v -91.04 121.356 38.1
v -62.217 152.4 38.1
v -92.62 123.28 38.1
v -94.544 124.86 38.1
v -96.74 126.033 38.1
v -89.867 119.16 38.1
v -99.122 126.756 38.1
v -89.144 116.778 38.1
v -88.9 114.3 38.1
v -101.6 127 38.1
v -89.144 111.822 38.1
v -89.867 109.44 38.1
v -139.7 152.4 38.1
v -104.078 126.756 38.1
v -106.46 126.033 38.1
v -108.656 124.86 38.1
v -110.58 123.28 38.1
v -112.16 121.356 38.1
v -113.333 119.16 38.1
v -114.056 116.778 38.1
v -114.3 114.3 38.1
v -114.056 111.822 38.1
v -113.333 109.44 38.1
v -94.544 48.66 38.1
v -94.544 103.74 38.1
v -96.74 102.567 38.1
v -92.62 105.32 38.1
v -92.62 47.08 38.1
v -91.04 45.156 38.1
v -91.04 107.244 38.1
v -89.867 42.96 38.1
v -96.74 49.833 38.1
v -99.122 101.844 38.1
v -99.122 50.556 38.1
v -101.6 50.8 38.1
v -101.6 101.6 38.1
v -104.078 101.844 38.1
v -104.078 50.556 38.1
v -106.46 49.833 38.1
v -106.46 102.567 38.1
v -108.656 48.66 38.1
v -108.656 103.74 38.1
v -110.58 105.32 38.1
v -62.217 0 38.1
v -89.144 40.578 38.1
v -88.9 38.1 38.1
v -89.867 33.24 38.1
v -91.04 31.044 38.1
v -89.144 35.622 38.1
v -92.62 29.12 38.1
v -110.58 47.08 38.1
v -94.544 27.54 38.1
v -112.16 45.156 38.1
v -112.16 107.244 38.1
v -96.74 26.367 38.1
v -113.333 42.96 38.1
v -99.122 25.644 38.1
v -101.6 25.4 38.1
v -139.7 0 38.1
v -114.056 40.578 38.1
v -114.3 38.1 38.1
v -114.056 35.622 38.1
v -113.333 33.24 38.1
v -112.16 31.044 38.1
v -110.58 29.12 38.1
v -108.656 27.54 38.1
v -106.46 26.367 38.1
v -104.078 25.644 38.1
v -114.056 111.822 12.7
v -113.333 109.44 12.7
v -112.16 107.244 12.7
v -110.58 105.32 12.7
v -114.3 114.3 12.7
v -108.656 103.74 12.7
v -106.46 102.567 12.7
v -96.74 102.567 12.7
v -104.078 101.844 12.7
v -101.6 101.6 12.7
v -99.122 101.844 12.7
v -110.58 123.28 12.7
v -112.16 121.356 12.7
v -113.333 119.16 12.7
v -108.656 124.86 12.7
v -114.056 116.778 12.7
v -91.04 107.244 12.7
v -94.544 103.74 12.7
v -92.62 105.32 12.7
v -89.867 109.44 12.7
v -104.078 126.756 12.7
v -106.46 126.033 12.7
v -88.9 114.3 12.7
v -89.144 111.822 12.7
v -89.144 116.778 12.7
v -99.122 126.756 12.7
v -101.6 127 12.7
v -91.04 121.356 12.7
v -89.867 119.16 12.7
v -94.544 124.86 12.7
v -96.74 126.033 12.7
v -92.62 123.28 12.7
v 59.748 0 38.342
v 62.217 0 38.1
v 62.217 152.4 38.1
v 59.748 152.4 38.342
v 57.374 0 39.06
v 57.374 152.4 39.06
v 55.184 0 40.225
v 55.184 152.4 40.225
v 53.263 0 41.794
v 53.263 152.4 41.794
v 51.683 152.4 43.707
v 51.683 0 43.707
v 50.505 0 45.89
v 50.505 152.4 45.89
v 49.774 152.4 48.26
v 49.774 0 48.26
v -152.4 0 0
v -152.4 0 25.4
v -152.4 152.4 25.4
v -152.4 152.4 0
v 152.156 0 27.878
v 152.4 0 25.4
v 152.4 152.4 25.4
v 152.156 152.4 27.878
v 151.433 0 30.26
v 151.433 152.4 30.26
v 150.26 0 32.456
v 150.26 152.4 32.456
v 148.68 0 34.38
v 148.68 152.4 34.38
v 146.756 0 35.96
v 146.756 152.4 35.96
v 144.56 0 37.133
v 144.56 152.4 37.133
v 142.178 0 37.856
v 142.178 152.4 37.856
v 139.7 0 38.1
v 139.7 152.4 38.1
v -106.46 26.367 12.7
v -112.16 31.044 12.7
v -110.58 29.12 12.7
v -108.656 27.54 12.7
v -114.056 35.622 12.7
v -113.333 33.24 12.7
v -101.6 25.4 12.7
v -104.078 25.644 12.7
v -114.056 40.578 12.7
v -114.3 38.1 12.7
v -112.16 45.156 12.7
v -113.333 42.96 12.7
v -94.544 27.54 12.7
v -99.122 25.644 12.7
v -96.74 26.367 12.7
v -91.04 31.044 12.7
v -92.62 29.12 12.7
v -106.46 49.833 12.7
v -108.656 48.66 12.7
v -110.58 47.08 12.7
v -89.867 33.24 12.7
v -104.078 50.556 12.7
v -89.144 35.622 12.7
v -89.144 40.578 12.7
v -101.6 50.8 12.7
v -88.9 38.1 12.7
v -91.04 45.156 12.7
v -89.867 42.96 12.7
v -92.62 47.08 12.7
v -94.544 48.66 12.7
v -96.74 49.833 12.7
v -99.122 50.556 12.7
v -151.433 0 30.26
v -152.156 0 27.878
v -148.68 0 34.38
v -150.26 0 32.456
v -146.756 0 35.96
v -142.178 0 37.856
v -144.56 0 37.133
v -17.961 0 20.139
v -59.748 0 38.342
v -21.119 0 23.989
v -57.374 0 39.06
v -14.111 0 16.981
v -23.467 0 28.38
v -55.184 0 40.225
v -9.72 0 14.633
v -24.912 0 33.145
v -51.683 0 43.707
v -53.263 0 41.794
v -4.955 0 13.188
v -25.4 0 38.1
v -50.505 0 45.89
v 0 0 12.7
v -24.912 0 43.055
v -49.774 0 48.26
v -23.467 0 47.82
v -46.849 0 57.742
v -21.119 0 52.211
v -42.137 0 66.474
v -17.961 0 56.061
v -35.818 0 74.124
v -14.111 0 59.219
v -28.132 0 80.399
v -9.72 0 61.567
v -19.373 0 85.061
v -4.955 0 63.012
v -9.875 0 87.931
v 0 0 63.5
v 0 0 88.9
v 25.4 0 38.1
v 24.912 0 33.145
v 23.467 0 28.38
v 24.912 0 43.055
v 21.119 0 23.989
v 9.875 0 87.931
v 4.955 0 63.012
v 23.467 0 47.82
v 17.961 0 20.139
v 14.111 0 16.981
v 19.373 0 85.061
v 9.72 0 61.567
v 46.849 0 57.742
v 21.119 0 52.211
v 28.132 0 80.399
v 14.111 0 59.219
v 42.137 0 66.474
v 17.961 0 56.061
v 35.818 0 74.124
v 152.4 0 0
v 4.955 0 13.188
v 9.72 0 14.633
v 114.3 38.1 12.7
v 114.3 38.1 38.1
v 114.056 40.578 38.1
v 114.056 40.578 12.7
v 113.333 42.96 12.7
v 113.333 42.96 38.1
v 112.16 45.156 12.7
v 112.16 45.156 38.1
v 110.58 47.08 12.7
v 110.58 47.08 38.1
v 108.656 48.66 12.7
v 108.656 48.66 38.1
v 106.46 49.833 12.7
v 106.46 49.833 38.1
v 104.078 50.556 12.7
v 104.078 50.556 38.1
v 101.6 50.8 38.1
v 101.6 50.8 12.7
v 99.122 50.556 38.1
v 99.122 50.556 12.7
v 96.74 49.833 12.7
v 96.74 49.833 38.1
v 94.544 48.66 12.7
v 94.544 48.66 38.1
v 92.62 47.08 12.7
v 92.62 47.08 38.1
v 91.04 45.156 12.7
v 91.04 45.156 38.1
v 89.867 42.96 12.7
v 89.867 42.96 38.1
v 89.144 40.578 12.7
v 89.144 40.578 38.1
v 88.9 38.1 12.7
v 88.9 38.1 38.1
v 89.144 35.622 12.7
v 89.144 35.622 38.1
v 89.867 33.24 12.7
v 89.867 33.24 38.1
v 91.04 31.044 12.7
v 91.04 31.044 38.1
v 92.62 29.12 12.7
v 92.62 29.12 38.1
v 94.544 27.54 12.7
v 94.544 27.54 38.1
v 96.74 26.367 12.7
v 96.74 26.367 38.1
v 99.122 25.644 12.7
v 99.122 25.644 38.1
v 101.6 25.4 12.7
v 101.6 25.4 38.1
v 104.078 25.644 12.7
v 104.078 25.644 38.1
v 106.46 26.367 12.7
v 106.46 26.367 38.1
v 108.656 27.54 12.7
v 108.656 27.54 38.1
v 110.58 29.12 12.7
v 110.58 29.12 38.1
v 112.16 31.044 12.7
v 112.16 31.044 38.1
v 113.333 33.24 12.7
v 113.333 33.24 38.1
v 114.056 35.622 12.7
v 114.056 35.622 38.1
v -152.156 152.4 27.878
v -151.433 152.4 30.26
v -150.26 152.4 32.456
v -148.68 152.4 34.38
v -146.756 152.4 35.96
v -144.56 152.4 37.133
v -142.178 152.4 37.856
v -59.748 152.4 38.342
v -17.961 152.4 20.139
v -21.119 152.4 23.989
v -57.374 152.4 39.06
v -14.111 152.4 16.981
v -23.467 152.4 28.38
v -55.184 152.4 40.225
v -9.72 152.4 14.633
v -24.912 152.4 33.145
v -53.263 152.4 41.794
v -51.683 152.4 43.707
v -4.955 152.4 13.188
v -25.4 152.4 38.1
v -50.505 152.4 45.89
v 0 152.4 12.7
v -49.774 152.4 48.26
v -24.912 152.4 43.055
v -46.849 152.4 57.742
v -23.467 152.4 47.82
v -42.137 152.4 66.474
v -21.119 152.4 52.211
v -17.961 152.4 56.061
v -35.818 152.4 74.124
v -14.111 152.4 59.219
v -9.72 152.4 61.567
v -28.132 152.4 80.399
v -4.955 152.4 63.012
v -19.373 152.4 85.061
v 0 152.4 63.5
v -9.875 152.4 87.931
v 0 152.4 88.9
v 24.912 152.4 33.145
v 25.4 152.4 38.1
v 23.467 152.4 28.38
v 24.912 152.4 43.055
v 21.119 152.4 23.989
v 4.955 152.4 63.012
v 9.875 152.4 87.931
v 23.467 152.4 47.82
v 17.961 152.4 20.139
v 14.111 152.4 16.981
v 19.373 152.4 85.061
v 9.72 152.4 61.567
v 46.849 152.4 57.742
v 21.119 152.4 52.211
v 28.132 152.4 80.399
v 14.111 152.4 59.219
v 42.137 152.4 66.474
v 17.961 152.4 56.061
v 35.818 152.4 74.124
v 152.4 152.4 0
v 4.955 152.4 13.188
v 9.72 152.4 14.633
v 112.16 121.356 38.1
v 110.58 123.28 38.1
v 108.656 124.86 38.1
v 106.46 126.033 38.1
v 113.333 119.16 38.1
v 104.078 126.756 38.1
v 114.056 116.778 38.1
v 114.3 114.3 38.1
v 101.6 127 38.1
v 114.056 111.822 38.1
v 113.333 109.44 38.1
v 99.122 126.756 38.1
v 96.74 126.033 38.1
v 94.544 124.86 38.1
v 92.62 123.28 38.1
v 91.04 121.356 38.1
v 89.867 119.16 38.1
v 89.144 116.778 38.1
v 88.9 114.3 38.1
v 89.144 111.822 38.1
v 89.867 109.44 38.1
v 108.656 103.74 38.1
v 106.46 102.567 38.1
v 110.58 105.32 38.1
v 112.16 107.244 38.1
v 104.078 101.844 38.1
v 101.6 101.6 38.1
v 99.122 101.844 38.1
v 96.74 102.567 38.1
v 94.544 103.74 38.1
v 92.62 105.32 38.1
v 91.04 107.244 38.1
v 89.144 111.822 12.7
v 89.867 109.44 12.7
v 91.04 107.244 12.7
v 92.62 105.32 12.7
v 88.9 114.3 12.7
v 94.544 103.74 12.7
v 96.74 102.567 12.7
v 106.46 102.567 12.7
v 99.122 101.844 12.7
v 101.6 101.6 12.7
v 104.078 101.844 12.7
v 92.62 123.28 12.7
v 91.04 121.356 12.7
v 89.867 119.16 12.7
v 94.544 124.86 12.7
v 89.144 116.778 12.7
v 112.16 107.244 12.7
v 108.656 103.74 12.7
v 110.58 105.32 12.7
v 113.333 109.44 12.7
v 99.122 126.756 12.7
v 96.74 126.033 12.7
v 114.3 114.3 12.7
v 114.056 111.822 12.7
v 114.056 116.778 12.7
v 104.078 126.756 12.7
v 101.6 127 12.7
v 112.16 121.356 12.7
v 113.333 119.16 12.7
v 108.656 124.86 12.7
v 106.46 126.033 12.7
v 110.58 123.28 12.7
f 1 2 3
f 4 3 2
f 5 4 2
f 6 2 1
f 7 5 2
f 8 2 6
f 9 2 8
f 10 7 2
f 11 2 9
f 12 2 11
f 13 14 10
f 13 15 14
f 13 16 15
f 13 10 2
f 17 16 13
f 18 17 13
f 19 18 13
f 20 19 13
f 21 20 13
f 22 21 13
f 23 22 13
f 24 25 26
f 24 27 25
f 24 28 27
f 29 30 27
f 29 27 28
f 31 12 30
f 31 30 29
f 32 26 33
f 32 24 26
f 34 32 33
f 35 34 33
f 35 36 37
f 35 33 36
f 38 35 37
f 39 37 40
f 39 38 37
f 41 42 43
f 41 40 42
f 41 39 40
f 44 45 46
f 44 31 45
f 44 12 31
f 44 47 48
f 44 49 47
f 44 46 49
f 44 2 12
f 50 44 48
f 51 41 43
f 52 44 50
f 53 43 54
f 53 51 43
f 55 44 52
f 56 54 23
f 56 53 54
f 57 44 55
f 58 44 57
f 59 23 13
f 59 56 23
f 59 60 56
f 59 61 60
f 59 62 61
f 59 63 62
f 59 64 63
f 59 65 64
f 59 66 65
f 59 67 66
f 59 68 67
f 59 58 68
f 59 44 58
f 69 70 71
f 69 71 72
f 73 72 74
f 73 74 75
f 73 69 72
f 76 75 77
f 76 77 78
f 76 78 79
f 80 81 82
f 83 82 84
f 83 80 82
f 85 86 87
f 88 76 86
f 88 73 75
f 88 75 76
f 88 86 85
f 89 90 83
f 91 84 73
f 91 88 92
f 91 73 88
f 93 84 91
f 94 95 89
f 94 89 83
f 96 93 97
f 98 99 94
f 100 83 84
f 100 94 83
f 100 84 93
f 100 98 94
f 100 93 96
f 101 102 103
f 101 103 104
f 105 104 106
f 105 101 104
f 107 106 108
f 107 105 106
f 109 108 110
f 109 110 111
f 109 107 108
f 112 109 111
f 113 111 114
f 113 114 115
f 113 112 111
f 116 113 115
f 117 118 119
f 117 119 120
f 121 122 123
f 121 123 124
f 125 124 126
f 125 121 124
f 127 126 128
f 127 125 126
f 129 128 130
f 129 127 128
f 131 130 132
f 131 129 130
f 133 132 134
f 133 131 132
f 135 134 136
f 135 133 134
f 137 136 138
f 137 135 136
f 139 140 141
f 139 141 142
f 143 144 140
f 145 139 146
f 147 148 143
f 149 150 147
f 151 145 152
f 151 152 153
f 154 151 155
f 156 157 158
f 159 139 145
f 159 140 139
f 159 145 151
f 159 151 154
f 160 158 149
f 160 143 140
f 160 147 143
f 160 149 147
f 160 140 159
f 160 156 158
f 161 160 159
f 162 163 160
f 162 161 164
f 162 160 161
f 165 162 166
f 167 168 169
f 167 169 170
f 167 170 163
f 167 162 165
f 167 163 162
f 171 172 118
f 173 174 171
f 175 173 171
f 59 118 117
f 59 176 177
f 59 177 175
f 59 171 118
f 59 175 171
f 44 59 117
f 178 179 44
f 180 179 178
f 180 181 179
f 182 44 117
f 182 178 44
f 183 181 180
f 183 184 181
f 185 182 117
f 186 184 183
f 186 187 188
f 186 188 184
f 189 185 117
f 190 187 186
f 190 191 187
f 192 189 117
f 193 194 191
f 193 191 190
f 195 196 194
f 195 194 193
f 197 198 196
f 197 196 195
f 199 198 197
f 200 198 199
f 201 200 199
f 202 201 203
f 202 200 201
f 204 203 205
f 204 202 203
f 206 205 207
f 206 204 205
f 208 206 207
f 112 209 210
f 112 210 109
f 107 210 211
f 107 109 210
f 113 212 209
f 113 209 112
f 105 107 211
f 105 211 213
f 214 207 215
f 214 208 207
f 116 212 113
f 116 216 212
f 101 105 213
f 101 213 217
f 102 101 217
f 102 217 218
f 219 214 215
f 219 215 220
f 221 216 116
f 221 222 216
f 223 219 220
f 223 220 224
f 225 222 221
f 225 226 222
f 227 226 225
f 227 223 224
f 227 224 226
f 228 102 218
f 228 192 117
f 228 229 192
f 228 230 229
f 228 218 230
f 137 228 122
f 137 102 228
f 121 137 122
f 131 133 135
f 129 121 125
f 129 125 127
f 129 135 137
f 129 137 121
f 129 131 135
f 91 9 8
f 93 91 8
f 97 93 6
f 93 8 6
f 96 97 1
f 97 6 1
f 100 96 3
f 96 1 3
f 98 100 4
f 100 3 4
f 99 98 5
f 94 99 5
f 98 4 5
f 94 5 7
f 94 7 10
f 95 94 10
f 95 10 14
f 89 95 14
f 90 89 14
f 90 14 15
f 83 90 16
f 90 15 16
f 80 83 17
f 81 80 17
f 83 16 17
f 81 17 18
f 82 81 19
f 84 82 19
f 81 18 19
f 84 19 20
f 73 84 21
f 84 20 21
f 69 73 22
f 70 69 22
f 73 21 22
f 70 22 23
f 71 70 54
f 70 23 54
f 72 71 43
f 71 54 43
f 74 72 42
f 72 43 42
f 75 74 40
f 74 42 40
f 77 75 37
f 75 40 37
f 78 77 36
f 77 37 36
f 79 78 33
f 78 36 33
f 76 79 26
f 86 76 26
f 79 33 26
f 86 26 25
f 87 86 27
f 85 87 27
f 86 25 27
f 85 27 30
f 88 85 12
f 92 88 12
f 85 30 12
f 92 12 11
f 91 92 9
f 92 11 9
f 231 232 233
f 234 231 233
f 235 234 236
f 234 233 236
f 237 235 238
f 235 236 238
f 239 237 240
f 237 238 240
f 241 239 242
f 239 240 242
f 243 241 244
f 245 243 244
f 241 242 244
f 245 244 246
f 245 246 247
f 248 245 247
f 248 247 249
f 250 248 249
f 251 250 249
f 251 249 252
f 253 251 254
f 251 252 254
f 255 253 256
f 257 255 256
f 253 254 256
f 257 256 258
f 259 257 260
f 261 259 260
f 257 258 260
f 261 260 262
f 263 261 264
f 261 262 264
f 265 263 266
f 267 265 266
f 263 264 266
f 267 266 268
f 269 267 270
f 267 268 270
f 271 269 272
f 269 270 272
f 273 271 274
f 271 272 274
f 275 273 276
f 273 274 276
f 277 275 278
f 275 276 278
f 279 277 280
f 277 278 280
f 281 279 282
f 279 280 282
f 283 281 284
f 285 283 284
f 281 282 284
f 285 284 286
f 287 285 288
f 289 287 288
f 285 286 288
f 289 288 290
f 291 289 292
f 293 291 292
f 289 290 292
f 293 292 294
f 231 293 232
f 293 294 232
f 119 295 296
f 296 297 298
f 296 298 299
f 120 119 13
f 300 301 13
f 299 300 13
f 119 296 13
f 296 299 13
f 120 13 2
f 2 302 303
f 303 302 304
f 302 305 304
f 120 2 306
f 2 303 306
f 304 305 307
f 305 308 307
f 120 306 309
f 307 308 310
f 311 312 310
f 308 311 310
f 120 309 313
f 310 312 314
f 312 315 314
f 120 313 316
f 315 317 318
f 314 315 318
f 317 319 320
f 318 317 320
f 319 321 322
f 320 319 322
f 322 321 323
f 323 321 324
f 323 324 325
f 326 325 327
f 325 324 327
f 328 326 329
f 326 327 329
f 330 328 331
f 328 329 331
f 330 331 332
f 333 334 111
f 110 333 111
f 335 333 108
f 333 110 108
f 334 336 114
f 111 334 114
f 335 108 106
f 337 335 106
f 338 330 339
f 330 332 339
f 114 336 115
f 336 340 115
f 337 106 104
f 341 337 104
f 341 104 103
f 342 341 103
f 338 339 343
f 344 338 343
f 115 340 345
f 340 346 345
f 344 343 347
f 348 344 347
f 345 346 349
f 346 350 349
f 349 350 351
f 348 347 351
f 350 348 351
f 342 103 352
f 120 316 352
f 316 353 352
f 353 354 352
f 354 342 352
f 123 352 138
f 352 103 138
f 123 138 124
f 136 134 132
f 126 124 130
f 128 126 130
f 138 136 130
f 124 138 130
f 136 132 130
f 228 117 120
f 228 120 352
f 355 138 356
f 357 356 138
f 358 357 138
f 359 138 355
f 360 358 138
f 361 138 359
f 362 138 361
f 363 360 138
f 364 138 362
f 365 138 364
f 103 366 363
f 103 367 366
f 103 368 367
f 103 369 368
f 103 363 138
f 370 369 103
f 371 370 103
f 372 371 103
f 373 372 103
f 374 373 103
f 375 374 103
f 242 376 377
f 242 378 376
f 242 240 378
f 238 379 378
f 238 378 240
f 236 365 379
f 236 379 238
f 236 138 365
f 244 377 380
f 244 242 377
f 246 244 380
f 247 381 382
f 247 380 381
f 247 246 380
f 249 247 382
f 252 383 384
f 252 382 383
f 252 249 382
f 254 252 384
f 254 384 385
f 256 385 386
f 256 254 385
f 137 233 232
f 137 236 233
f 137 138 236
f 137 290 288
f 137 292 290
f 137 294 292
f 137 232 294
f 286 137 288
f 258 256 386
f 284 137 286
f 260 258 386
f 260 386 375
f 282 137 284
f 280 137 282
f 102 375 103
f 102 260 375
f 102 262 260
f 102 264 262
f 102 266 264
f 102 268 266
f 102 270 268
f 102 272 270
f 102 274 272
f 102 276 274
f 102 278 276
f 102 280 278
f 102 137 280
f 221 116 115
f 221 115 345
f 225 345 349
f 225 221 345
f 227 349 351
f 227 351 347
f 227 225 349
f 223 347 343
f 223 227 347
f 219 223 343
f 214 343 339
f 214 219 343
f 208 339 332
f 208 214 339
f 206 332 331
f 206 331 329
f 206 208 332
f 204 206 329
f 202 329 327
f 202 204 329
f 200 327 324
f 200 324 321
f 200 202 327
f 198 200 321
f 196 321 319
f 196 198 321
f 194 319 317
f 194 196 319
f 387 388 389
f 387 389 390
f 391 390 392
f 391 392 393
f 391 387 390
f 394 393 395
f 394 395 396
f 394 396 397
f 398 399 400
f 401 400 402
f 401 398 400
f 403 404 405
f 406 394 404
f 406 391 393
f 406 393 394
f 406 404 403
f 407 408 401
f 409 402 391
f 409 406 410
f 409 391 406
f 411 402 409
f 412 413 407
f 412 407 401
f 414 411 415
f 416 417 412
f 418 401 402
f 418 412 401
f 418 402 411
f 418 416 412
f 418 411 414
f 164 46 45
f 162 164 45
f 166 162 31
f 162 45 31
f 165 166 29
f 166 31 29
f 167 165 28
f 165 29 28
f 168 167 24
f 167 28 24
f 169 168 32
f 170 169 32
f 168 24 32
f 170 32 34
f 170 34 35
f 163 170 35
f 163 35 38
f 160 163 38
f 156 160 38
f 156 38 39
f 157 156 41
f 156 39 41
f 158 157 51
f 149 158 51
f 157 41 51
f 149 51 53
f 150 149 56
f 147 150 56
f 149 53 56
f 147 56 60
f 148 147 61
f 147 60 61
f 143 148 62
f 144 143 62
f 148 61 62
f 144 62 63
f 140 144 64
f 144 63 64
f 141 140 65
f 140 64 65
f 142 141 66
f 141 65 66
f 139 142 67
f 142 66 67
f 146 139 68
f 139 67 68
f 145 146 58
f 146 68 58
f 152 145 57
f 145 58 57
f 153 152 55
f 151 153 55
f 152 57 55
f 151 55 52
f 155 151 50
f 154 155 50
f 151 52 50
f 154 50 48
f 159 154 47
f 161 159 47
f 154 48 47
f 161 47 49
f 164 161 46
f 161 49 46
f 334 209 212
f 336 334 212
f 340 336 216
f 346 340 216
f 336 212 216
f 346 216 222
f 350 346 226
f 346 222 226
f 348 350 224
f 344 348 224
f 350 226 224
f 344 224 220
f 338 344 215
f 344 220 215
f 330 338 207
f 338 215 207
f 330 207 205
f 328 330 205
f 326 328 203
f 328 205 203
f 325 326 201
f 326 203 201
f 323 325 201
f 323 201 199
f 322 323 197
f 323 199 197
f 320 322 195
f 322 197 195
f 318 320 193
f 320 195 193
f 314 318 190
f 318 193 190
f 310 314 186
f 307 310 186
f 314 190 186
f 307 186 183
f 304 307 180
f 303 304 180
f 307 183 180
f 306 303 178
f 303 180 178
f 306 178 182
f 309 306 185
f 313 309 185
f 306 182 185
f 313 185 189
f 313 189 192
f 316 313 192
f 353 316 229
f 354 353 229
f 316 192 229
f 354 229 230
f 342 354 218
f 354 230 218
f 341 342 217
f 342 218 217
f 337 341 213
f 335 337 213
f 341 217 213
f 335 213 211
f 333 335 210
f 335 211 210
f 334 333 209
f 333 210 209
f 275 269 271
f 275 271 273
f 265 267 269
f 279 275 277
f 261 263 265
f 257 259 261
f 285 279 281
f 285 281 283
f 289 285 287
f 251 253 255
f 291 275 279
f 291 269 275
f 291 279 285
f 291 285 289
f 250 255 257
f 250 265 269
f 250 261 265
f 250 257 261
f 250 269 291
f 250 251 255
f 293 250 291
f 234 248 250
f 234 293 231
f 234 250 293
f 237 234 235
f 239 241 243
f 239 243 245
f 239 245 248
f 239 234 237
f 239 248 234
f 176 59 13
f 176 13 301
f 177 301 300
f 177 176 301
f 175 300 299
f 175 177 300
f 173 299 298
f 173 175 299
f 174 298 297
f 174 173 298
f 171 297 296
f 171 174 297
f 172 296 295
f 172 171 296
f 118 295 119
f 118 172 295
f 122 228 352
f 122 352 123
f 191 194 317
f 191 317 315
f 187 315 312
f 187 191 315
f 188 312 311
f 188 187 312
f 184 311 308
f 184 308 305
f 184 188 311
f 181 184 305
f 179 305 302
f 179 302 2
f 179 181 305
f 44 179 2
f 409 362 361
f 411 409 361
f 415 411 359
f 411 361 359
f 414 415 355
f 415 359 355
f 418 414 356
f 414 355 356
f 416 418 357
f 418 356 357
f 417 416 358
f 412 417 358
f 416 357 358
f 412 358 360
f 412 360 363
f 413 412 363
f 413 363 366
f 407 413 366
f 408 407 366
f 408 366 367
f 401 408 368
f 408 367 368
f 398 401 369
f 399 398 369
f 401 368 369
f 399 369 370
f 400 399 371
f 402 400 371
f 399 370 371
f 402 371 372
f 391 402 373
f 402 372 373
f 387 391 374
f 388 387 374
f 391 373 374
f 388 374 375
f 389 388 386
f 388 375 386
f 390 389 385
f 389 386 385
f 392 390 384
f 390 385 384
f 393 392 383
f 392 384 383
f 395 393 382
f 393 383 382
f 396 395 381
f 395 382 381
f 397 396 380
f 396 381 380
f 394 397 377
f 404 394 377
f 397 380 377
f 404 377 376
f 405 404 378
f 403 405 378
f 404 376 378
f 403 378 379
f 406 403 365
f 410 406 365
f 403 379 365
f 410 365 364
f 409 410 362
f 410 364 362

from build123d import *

# Parameters (mm, degrees)
F0_R     = 25.4
F1_DEPTH = 152.4
F2_R     = 12.7
F3_DEPTH = 25.4


with BuildPart() as f1:
    # F0 (on Front) → F1 (new body)
    with BuildSketch(Plane.XZ):
        with BuildLine():
            Line((-152.4, 25.4), (-152.4, 0))
            Line((-152.4, 0), (152.4, 0))
            Line((152.4, 0), (152.4, 25.4))
            ThreePointArc((152.4, 25.4), (148.680256, 34.380256), (139.7, 38.1))
            Line((139.7, 38.1), (62.217039, 38.1))
            ThreePointArc((62.217039, 38.1), (54.184854, 40.962622), (49.773632, 48.26))
            ThreePointArc((49.773632, 48.26), (0, 88.9), (-49.773632, 48.26))
            ThreePointArc((-49.773632, 48.26), (-54.184854, 40.962622), (-62.217039, 38.1))
            Line((-62.217039, 38.1), (-139.7, 38.1))
            ThreePointArc((-139.7, 38.1), (-148.680256, 34.380256), (-152.4, 25.4))
        make_face()
        with Locations((0, 38.1)):
            Circle(F0_R, mode=Mode.SUBTRACT)
    extrude(amount=-F1_DEPTH)

    # F2 (on face) → F3 (cut)
    with BuildSketch(Plane.XY.offset(38.1)):
        with Locations((-101.6, 114.3)):
            Circle(F2_R)
        with Locations((-101.6, 38.1)):
            Circle(F2_R)
        with Locations((101.6, 114.3)):
            Circle(F2_R)
        with Locations((101.6, 38.1)):
            Circle(F2_R)
    extrude(amount=-F3_DEPTH, mode=Mode.SUBTRACT)


solid = f1.part
